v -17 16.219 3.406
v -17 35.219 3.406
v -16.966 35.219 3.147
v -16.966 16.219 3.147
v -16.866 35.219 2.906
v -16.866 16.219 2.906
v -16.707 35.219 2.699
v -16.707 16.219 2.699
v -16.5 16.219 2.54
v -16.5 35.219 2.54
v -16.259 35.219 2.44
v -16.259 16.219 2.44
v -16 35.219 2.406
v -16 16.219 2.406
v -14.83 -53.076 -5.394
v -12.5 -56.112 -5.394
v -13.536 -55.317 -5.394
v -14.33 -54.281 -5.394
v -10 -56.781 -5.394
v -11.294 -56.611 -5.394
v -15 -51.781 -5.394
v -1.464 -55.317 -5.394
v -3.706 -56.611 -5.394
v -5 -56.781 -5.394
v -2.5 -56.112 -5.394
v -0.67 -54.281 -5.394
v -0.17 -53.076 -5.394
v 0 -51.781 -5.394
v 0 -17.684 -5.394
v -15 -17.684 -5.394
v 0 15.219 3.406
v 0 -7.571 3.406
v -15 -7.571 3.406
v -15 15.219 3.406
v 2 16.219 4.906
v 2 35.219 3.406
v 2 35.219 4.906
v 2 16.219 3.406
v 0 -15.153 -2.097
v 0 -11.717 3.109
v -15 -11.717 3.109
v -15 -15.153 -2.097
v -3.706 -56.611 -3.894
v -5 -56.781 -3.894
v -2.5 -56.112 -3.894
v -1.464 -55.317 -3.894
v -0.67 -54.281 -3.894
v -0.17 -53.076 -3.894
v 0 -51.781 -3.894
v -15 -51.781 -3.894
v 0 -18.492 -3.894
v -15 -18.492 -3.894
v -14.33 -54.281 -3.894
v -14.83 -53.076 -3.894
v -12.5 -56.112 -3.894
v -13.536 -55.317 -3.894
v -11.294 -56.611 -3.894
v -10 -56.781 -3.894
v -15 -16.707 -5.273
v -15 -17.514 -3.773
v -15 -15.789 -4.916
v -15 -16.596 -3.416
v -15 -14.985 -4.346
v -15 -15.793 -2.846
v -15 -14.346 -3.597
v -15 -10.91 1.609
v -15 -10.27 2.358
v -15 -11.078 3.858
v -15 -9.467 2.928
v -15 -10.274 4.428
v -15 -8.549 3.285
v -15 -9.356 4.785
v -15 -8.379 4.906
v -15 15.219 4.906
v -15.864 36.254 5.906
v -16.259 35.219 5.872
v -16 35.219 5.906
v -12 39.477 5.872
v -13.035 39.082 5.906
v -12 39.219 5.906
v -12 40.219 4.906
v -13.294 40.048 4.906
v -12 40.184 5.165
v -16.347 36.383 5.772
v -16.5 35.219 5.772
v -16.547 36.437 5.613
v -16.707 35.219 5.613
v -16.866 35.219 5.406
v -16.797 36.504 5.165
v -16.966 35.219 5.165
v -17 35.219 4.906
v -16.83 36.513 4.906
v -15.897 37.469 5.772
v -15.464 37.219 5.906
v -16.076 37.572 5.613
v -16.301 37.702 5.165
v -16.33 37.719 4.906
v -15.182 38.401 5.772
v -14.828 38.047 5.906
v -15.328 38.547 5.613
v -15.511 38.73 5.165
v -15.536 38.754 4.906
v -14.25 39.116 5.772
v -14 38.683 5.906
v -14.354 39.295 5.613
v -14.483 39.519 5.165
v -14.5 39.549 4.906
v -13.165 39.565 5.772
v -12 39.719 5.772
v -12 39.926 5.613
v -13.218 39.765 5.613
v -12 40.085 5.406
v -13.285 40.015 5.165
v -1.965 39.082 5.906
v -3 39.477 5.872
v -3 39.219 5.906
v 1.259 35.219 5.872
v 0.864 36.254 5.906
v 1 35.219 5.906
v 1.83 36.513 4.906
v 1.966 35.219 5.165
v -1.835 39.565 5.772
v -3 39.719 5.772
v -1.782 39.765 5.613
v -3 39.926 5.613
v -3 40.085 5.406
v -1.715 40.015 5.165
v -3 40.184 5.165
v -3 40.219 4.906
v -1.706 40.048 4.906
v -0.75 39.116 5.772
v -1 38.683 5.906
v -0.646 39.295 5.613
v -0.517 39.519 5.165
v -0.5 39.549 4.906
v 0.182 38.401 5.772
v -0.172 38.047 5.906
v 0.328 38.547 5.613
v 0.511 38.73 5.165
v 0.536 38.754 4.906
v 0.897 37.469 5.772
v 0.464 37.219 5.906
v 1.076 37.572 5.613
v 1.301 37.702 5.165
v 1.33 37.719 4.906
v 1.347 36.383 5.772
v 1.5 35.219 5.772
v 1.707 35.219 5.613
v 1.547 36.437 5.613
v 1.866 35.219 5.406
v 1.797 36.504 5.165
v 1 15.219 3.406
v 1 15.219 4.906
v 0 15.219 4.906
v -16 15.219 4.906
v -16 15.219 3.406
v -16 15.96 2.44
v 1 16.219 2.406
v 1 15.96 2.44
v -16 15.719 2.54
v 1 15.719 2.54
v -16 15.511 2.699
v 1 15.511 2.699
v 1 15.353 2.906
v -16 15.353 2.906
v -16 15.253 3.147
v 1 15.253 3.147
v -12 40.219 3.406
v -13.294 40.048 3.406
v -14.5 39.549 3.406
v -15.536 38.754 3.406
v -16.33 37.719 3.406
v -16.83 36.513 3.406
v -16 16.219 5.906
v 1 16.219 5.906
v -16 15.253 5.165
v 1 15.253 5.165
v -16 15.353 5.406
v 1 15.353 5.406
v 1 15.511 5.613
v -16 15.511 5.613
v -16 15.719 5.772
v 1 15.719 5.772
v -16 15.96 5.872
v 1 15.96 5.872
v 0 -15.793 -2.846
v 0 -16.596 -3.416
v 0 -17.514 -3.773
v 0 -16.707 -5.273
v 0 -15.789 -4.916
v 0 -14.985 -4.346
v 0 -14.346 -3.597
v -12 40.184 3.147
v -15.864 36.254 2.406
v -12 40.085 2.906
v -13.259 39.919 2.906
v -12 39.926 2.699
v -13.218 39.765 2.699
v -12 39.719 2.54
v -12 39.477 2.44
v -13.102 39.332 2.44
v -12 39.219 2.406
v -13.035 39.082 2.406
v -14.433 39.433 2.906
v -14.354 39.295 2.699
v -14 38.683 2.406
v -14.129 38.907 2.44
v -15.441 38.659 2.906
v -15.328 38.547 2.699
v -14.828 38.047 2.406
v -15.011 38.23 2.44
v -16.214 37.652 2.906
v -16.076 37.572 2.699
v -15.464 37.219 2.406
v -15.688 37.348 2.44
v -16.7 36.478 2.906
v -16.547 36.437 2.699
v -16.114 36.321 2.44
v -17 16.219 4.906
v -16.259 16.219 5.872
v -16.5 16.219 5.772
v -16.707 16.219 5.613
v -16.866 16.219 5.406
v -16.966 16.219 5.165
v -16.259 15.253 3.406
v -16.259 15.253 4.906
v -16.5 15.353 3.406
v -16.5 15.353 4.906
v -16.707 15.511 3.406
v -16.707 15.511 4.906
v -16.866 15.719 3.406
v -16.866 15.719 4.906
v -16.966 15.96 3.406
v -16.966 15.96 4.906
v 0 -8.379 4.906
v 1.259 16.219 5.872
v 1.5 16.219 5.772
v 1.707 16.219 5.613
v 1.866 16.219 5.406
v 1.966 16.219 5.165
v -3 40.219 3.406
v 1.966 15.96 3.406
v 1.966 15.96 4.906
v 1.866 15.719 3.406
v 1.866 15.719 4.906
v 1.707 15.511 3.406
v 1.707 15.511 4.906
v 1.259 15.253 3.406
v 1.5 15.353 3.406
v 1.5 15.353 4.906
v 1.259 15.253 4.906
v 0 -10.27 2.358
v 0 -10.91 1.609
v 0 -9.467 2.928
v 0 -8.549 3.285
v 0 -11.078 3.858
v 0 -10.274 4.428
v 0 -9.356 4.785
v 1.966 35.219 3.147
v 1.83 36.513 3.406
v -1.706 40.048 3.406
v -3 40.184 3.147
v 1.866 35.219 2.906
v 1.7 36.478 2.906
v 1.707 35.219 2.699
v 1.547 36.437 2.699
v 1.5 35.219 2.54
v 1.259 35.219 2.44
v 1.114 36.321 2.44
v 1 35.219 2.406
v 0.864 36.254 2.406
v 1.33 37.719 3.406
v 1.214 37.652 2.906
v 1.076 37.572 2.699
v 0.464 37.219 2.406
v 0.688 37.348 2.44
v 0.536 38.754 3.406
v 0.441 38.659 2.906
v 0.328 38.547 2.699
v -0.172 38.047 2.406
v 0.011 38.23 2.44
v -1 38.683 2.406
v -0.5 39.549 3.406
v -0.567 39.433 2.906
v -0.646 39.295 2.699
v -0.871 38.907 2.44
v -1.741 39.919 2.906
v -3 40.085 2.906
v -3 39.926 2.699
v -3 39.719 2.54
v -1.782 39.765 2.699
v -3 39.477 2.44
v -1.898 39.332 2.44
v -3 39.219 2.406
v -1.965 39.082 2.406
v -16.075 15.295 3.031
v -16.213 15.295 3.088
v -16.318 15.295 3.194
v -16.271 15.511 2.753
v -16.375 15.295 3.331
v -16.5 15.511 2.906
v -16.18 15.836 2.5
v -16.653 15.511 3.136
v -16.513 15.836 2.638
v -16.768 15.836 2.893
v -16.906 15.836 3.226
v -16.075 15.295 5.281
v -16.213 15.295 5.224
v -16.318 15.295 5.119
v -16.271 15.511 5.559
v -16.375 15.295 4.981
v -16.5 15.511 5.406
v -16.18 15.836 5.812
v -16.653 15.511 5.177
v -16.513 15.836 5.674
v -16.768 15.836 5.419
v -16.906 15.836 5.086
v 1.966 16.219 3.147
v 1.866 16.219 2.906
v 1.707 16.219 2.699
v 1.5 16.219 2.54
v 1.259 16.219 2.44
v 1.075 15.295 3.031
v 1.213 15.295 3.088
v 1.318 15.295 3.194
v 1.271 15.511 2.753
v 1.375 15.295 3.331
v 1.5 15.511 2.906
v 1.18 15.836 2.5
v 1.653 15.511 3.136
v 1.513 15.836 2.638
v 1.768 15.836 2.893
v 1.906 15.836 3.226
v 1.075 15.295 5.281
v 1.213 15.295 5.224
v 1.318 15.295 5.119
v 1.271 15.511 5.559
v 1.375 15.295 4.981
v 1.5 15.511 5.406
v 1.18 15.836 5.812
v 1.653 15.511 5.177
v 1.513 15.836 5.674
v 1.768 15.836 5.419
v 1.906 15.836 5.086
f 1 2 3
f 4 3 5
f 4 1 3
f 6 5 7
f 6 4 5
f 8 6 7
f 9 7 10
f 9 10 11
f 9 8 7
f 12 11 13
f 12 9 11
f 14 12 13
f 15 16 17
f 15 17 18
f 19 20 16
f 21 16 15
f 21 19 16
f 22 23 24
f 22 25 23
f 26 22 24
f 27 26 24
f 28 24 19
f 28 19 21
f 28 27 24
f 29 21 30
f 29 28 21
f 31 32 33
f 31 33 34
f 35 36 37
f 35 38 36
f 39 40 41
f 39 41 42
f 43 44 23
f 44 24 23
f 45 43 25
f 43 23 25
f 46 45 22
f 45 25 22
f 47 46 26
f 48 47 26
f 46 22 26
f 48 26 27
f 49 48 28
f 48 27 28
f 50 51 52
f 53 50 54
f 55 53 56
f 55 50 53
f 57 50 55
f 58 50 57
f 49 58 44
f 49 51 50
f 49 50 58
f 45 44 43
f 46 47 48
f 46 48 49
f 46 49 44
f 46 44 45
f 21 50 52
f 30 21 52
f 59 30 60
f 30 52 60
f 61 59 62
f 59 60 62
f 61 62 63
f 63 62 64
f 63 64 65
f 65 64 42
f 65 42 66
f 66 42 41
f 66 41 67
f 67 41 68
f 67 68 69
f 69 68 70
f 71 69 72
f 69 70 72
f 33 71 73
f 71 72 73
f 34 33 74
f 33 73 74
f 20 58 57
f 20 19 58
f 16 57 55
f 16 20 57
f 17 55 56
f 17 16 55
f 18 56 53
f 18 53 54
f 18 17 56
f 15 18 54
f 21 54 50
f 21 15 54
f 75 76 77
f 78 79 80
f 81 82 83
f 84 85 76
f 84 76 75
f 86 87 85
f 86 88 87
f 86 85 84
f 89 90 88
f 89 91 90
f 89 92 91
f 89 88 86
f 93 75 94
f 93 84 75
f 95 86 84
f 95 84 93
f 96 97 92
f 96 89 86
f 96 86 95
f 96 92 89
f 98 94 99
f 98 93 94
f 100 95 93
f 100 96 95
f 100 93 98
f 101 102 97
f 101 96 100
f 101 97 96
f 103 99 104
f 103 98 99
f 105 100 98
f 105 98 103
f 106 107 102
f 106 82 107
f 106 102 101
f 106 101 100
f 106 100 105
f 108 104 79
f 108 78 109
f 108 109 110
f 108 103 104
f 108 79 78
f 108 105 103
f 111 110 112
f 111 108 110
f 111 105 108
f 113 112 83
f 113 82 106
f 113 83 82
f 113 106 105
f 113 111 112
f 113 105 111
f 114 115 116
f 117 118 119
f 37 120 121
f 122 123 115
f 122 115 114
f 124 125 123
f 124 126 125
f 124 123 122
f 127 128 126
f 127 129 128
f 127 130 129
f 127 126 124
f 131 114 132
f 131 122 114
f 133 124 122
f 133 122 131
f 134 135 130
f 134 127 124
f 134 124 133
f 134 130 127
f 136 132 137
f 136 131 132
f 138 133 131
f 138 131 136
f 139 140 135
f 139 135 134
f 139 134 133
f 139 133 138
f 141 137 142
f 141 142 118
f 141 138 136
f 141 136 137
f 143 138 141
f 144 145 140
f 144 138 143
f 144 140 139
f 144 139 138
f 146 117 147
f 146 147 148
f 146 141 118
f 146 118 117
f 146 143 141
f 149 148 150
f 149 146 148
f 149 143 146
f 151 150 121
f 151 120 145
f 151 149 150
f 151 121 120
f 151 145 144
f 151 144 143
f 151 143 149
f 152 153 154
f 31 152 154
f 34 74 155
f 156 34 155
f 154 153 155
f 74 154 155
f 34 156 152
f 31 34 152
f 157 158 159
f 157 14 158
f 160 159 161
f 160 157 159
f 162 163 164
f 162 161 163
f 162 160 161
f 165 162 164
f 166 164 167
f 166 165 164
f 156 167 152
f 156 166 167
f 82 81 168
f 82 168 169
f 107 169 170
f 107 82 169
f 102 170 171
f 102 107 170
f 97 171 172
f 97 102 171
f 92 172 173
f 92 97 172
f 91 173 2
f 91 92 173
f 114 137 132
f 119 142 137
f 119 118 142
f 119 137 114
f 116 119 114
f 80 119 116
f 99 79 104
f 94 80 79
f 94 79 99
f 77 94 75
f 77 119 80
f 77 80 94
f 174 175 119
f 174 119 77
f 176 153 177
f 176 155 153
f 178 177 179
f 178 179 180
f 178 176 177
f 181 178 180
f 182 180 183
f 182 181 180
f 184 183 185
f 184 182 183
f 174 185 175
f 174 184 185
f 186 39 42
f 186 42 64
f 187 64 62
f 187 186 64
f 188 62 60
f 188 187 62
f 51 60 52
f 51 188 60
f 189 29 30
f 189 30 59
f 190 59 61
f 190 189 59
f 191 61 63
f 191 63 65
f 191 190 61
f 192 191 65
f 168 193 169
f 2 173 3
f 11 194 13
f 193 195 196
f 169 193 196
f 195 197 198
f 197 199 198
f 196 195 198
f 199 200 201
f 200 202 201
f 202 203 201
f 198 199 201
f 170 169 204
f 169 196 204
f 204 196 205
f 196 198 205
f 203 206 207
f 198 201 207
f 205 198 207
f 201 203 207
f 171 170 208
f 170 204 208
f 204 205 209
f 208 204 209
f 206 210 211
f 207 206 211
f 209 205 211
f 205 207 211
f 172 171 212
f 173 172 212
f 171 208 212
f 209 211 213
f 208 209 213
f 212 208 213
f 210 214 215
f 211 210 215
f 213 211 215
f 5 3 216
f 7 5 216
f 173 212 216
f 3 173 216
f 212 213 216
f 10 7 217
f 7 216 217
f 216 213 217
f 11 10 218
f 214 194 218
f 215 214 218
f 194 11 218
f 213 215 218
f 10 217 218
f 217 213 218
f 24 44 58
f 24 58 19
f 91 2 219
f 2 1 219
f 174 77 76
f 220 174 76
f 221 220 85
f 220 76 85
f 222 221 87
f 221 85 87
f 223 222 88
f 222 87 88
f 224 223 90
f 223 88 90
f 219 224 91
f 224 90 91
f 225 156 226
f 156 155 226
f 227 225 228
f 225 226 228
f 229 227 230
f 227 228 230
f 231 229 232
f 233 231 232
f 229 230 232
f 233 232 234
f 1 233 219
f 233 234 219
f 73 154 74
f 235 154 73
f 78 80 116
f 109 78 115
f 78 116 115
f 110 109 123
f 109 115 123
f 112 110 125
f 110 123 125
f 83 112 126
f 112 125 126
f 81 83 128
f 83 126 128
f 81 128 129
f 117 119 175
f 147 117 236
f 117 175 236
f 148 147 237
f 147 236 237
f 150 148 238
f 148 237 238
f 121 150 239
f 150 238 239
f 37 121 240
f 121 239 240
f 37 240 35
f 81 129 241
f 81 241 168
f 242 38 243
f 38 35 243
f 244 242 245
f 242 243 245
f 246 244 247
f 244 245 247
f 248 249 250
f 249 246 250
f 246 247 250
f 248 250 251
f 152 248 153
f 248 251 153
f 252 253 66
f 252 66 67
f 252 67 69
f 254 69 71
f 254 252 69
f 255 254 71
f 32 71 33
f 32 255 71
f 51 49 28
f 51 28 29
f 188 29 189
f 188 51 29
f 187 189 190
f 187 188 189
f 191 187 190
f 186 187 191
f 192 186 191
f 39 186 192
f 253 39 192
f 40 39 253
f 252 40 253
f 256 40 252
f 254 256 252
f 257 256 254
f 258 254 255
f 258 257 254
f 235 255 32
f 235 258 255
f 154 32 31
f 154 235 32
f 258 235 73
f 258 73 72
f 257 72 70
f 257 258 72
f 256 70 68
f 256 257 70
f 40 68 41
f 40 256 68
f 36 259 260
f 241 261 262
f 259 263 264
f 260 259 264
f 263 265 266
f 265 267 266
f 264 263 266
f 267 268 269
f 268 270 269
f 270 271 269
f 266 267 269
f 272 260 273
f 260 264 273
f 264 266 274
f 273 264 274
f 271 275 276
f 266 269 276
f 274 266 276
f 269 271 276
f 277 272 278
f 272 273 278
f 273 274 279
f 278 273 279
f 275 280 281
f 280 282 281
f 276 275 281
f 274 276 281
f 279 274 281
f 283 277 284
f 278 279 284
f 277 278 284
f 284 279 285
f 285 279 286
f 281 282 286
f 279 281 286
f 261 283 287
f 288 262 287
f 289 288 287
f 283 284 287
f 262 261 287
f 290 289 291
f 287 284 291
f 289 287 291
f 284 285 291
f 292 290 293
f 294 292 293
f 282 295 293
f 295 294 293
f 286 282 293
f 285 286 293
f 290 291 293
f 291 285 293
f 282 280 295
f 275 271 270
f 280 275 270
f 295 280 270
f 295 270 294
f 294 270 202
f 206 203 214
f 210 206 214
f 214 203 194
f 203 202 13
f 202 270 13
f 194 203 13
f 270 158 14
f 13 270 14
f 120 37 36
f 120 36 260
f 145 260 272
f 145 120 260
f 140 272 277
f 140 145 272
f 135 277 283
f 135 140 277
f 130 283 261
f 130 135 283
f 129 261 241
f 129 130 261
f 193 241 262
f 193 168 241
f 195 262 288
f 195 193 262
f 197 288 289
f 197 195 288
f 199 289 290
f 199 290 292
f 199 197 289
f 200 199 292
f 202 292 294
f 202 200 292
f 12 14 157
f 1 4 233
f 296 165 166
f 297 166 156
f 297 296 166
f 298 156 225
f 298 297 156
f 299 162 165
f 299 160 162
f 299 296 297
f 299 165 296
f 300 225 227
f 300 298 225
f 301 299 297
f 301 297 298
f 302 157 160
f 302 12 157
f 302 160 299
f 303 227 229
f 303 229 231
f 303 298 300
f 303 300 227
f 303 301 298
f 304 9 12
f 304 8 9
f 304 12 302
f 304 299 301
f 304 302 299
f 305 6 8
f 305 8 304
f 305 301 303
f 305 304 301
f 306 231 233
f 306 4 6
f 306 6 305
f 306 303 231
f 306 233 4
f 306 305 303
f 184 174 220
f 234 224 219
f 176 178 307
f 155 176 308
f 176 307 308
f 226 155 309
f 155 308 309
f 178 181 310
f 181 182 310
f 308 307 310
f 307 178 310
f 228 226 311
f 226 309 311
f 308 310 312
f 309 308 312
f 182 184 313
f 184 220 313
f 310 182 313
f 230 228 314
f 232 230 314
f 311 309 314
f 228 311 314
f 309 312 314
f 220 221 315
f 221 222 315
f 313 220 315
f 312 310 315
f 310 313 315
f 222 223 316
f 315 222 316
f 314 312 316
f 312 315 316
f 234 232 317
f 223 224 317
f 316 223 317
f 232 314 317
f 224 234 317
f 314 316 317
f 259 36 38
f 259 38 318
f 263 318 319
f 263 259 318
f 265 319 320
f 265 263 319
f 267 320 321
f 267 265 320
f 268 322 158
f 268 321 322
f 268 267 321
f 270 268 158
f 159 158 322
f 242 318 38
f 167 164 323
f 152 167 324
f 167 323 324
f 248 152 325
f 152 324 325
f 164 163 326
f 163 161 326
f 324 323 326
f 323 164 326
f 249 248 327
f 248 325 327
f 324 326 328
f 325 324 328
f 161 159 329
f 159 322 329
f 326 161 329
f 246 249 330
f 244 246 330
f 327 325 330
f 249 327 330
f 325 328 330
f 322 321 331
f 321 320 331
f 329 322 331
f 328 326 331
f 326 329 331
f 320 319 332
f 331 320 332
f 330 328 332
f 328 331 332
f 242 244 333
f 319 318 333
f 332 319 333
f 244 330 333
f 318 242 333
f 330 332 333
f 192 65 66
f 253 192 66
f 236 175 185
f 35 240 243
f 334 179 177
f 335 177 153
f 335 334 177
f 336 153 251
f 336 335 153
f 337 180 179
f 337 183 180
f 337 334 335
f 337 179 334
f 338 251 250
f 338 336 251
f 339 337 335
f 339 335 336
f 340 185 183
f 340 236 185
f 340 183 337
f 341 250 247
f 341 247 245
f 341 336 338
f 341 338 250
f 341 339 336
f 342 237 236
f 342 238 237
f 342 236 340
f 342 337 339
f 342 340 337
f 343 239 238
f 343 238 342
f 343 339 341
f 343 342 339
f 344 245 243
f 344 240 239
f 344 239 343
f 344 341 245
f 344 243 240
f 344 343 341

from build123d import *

# Parameters (mm, degrees)
F1_DEPTH = 15
F2_R     = 5
F3_W     = 19
F3_H     = 3.5
F4_DEPTH = 25
F5_R     = 5
F6_R     = 0.99999


# Not quite as in the source:
# - a fillet or chamfer is up to 0.001 mm smaller than in the source, because OpenCascade refuses the exact size


with BuildPart() as f1:
    # F0 (on Right) → F1 (new body)
    with BuildSketch(Plane.YZ):
        with BuildLine():
            Line((15.2185663986, 4.9061592609), (-8.3786299068, 4.9061592609))
            ThreePointArc((-8.3786299068, 4.9061592609), (-10.2743175345, 4.4284267718), (-11.7171893777, 3.10934347))
            Line((-11.7171893777, 3.10934347), (-15.1529792105, -2.0970249483))
            ThreePointArc((-15.1529792105, -2.0970249483), (-16.5958510537, -3.41610825), (-18.4915386814, -3.8938407391))
            Line((-18.4915386814, -3.8938407391), (-56.7814336014, -3.8938407391))
            Line((-56.7814336014, -3.8938407391), (-56.7814336014, -5.3938407391))
            Line((-56.7814336014, -5.3938407391), (-17.6842372959, -5.3938407391))
            ThreePointArc((-17.6842372959, -5.3938407391), (-15.7885496683, -4.91610825), (-14.3456778251, -3.5970249483))
            Line((-14.3456778251, -3.5970249483), (-10.9098879922, 1.60934347))
            ThreePointArc((-10.9098879922, 1.60934347), (-9.467016149, 2.9284267718), (-7.5713285214, 3.4061592609))
            Line((-7.5713285214, 3.4061592609), (15.2185663986, 3.4061592609))
            Line((15.2185663986, 3.4061592609), (15.2185663986, 4.9061592609))
        make_face()
    extrude(amount=-F1_DEPTH)

    # F2
    f2_edges = [f1.edges().sort_by_distance(p)[0] for p in [
        (-15, -56.781434, -4.643841),
        (0, -56.781434, -4.643841),
    ]]
    fillet(f2_edges, radius=F2_R)

    # F3 (on face) → F4 (join)
    with BuildSketch(Plane(origin=(0, 15.2185663986, 0), x_dir=(-1, 0, 0), z_dir=(0, 1, 0))):
        with Locations((7.5, 4.1561592609)):
            Rectangle(F3_W, F3_H)
    extrude(amount=F4_DEPTH)

    # F5
    f5_edges = [f1.edges().sort_by_distance(p)[0] for p in [
        (2, 40.218566, 4.156159),
        (-17, 40.218566, 4.156159),
    ]]
    fillet(f5_edges, radius=F5_R)

    # F6 (radius 1 in the source; OpenCascade refuses exactly that, so slightly less here)
    f6_edges = [f1.edges().sort_by_distance(p)[0] for p in [
        (-17, 25.218566, 5.906159),
        (-15.535534, 38.7541, 5.906159),
        (-7.5, 15.218566, 5.906159),
        (-7.5, 40.218566, 5.906159),
        (2, 25.218566, 5.906159),
        (0.535534, 38.7541, 5.906159),
        (2, 25.218566, 2.406159),
        (0.535534, 38.7541, 2.406159),
        (-7.5, 15.218566, 2.406159),
        (-7.5, 40.218566, 2.406159),
        (-17, 25.218566, 2.406159),
        (-15.535534, 38.7541, 2.406159),
        (2, 15.218566, 4.156159),
        (-17, 15.218566, 4.156159),
    ]]
    fillet(f6_edges, radius=F6_R)


solid = f1.part
